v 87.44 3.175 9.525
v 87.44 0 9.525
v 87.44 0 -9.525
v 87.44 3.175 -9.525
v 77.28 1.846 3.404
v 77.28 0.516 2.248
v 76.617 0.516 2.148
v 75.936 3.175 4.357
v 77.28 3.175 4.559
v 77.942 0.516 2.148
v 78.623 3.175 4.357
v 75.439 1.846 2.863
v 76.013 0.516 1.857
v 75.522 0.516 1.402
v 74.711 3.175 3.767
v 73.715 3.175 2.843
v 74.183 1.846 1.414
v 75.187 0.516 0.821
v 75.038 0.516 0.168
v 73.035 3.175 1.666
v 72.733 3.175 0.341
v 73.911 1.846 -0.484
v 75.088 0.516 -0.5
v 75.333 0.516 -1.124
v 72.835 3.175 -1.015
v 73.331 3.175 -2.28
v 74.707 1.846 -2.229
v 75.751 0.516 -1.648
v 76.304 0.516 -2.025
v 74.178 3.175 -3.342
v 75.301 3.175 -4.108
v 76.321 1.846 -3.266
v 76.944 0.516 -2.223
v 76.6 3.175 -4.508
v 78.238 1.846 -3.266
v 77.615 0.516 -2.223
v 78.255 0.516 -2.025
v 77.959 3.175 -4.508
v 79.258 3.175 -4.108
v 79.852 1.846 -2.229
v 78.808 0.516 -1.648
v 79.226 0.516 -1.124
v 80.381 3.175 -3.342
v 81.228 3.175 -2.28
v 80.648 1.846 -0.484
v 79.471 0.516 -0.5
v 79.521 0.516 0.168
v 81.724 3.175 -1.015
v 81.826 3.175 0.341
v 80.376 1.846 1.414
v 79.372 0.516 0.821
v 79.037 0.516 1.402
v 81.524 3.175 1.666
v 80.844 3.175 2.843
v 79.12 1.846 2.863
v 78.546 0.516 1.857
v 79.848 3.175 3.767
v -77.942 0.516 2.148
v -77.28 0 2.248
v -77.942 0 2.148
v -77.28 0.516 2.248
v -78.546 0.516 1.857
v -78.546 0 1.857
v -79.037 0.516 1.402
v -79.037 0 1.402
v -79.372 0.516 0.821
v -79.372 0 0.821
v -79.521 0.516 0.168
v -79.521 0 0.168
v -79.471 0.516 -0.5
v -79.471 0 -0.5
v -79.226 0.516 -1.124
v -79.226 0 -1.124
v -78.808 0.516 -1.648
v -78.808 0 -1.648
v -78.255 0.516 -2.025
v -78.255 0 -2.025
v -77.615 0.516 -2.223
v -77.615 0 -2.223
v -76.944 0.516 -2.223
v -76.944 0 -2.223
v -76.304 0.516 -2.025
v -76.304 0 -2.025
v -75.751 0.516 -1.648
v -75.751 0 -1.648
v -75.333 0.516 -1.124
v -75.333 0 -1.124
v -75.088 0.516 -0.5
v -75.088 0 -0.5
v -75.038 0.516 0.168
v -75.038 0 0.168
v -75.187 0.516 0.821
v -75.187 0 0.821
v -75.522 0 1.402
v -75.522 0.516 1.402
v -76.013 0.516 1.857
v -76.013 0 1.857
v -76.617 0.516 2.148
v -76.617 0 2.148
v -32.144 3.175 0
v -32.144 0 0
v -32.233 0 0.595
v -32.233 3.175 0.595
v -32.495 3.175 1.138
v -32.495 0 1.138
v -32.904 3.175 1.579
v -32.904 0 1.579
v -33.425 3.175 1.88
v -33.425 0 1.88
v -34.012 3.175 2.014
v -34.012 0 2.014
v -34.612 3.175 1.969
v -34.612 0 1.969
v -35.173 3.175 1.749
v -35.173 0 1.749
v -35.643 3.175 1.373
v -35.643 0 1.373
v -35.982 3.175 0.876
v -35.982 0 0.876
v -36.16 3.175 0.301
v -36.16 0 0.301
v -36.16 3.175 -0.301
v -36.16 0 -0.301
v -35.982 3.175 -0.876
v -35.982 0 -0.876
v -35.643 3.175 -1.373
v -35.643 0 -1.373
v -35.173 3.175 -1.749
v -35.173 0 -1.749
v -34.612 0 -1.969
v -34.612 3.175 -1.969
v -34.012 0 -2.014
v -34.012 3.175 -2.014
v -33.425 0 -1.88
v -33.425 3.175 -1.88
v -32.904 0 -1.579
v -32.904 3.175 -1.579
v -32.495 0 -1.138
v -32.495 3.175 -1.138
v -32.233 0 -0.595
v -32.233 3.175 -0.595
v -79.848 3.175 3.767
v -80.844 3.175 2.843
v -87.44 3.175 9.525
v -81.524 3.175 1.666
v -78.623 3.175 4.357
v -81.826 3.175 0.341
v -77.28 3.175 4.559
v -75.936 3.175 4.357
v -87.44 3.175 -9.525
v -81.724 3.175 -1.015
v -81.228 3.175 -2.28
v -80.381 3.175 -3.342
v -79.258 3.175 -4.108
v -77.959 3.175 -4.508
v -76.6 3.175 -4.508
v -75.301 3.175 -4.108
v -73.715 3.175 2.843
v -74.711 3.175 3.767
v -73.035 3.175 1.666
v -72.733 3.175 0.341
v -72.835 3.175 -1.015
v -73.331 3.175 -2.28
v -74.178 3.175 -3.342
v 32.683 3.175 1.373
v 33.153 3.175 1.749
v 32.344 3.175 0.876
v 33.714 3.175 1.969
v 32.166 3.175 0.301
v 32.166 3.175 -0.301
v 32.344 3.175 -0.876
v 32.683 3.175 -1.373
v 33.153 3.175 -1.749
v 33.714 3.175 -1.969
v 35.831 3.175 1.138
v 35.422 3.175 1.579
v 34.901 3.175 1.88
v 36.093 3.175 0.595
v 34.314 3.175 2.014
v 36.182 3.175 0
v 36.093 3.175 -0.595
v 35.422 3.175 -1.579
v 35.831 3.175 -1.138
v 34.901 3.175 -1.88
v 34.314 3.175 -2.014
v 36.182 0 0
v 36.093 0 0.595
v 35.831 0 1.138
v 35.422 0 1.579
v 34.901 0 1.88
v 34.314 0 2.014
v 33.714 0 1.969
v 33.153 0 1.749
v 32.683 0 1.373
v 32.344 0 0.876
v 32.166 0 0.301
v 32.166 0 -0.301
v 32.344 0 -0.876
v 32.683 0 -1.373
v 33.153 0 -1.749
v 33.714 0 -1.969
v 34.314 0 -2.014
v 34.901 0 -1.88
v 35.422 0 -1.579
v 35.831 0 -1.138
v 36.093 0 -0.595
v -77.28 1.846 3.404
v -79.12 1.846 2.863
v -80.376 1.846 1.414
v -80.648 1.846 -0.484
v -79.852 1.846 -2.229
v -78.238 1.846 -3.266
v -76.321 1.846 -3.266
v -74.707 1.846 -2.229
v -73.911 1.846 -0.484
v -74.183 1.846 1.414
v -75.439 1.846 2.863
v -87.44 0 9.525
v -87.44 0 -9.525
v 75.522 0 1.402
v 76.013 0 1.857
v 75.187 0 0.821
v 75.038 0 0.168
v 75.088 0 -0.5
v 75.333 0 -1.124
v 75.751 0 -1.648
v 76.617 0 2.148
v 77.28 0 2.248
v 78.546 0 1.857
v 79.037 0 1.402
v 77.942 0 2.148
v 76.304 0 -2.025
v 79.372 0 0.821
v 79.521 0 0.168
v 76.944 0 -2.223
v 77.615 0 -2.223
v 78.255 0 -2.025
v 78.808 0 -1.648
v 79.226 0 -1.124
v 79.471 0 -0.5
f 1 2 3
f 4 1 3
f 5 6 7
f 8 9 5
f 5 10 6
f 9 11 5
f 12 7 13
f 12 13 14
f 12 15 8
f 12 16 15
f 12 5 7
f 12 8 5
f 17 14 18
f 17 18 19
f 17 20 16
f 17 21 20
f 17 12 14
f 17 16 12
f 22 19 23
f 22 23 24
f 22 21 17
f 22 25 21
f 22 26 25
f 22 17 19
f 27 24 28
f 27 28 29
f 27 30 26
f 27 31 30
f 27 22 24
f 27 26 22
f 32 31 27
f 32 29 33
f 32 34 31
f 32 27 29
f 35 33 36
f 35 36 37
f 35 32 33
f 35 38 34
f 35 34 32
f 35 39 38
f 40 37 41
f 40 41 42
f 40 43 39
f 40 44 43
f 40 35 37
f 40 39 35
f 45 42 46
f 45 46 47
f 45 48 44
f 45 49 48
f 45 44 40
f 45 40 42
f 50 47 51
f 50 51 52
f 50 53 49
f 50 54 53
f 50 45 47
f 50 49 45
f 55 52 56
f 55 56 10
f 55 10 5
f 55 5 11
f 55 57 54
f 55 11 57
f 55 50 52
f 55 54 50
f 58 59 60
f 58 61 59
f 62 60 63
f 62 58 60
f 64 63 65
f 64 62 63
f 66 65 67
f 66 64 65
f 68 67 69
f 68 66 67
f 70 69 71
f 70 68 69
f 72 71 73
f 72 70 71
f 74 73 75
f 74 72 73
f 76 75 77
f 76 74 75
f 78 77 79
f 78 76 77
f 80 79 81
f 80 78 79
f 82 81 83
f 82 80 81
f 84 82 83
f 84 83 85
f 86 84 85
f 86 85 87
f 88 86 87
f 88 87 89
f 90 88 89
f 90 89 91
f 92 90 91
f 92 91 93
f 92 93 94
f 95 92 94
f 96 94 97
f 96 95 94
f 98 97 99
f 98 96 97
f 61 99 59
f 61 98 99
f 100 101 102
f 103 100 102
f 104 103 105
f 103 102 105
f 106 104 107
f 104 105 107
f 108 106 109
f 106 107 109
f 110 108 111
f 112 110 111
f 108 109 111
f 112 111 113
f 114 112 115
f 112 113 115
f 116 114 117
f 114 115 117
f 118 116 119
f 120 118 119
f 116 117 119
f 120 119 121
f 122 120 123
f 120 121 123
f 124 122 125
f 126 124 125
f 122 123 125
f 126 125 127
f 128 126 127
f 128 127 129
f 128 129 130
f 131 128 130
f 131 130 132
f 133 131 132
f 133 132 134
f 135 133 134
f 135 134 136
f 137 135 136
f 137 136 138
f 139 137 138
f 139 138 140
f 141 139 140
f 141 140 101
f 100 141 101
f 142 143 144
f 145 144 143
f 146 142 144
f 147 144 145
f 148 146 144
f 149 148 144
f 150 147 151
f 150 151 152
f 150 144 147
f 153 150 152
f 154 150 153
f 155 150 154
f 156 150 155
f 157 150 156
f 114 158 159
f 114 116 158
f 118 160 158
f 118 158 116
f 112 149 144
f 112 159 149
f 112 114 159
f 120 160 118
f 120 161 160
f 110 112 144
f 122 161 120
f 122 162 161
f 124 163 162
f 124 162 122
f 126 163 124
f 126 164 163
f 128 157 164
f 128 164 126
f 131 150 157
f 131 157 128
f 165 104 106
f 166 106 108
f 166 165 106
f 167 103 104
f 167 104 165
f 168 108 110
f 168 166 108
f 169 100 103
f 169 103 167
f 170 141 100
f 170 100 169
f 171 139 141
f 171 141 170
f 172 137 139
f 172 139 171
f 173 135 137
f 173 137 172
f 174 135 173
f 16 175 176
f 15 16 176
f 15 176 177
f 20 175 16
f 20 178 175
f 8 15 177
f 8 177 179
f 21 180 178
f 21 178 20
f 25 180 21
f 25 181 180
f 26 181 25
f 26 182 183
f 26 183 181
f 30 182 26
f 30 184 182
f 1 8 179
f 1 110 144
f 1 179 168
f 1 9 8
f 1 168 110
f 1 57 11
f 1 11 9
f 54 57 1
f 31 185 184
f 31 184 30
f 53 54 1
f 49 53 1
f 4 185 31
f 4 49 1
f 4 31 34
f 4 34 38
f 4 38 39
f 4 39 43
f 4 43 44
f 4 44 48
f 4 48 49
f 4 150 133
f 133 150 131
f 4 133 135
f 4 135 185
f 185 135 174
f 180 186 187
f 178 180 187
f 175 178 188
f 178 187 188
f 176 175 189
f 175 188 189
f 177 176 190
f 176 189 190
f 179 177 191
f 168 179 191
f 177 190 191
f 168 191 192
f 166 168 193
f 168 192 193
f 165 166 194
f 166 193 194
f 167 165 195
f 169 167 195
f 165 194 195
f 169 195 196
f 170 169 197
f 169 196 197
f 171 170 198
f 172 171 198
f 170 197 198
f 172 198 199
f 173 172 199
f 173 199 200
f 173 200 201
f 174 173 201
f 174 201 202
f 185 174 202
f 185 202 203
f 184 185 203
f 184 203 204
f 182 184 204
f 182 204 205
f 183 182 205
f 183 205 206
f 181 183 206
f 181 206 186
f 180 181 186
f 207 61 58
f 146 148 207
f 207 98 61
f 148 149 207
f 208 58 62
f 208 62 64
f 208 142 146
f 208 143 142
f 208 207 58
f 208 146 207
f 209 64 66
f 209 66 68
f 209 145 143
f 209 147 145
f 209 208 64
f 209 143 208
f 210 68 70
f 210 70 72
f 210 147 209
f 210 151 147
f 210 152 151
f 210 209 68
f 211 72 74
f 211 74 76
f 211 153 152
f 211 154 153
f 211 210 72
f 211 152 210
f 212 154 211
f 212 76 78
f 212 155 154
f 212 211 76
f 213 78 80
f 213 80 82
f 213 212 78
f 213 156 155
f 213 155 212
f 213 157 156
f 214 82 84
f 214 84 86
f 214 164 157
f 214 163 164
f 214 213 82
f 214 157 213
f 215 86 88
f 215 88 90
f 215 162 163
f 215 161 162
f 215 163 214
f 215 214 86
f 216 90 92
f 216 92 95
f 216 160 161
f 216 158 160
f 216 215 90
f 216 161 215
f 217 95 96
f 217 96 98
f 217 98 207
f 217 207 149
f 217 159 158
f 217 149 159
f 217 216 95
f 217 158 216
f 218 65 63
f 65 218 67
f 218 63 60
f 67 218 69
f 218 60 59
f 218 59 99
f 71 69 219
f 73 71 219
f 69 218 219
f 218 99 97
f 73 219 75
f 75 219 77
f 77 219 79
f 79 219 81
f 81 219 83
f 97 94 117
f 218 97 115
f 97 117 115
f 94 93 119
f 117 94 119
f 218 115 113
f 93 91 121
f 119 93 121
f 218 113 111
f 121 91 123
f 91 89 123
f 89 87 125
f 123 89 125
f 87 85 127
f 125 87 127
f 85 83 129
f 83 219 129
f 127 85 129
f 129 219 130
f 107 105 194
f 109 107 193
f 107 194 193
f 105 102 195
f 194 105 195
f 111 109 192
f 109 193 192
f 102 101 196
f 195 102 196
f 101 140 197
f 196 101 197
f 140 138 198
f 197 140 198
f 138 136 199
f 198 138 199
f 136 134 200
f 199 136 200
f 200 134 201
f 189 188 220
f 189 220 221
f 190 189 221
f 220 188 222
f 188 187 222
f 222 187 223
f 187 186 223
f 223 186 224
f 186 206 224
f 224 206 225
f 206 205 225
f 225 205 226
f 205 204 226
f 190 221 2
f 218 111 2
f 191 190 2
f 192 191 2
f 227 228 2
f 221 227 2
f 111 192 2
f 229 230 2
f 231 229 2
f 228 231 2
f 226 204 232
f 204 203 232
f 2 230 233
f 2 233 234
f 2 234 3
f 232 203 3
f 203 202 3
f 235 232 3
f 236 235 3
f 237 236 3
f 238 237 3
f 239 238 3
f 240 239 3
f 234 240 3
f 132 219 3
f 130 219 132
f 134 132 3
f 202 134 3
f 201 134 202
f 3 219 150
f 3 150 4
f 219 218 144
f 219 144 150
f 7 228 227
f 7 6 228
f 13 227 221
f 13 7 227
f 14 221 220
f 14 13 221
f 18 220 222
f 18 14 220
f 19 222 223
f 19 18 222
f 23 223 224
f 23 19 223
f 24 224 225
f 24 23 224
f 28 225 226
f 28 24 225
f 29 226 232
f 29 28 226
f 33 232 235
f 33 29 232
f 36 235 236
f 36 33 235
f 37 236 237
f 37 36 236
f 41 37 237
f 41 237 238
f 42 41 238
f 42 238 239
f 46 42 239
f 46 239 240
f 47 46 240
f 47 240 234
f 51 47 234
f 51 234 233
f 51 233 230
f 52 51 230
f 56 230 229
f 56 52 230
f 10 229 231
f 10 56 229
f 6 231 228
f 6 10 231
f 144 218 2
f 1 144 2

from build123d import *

# Parameters (mm, degrees)
SKETCH1_W                                     = 174.879
SKETCH1_H                                     = 19.05
BOSS_EXTRUDE1_DEPTH                           = 3.175
F_10_32_TAPPED_HOLE1_D                        = 4.0386
F_10_32_TAPPED_HOLE1_DEPTH                    = 11.938
F_10_32_TAPPED_HOLE1_TIP                      = 1.213317848
CSK_FOR_8_FLAT_HEAD_SOCKET_CAP_SCREW1_A_COUNT = 2
CSK_FOR_8_FLAT_HEAD_SOCKET_CAP_SCREW1_A_PITCH = 154.559


with BuildPart() as part:
    # Sketch1 → Boss-Extrude1 (new body)
    with BuildSketch(Plane(origin=(0, 0, 0), x_dir=(1, 0, 0), z_dir=(0, 1, 0))):
        Rectangle(SKETCH1_W, SKETCH1_H)
    extrude(amount=BOSS_EXTRUDE1_DEPTH)

    # #10-32 Tapped Hole1
    with Locations(Plane(origin=(0, 3.175, 0), x_dir=(-1, 0, 0), z_dir=(0, 1, 0))):
        with Locations((34.163, 0), (-34.163, 0)):
            Hole(F_10_32_TAPPED_HOLE1_D / 2, depth=F_10_32_TAPPED_HOLE1_DEPTH)
            with Locations((0, 0, -(F_10_32_TAPPED_HOLE1_DEPTH + F_10_32_TAPPED_HOLE1_TIP / 2))):  # 118° drill point
                Cone(0, F_10_32_TAPPED_HOLE1_D / 2, F_10_32_TAPPED_HOLE1_TIP, mode=Mode.SUBTRACT)

    # Sketch10 → CSK for #8 Flat Head Socket Cap Screw1 (revolve, cut)
    with BuildSketch(Plane(origin=(-77.2795, 3.175, 0), x_dir=(0, 0, 1), z_dir=(1, 0, 0))):
        Polygon((0, 0), (0, 3.175), (2.2479, 3.175), (2.2479, 2.658961536), (4.5593, 0), align=None)
    csk_for_8_flat_head_socket_cap_screw1 = revolve(axis=Axis((-77.2795, 9.525, 0), (0, -1, 0)), mode=Mode.SUBTRACT)

    # CSK for #8 Flat Head Socket Cap Screw1 a: CSK for #8 Flat Head Socket Cap Screw1 ×2
    with Locations(*[(i * CSK_FOR_8_FLAT_HEAD_SOCKET_CAP_SCREW1_A_PITCH, 0, 0) for i in range(1, CSK_FOR_8_FLAT_HEAD_SOCKET_CAP_SCREW1_A_COUNT)]):
        add(csk_for_8_flat_head_socket_cap_screw1, mode=Mode.SUBTRACT)


solid = part.part
